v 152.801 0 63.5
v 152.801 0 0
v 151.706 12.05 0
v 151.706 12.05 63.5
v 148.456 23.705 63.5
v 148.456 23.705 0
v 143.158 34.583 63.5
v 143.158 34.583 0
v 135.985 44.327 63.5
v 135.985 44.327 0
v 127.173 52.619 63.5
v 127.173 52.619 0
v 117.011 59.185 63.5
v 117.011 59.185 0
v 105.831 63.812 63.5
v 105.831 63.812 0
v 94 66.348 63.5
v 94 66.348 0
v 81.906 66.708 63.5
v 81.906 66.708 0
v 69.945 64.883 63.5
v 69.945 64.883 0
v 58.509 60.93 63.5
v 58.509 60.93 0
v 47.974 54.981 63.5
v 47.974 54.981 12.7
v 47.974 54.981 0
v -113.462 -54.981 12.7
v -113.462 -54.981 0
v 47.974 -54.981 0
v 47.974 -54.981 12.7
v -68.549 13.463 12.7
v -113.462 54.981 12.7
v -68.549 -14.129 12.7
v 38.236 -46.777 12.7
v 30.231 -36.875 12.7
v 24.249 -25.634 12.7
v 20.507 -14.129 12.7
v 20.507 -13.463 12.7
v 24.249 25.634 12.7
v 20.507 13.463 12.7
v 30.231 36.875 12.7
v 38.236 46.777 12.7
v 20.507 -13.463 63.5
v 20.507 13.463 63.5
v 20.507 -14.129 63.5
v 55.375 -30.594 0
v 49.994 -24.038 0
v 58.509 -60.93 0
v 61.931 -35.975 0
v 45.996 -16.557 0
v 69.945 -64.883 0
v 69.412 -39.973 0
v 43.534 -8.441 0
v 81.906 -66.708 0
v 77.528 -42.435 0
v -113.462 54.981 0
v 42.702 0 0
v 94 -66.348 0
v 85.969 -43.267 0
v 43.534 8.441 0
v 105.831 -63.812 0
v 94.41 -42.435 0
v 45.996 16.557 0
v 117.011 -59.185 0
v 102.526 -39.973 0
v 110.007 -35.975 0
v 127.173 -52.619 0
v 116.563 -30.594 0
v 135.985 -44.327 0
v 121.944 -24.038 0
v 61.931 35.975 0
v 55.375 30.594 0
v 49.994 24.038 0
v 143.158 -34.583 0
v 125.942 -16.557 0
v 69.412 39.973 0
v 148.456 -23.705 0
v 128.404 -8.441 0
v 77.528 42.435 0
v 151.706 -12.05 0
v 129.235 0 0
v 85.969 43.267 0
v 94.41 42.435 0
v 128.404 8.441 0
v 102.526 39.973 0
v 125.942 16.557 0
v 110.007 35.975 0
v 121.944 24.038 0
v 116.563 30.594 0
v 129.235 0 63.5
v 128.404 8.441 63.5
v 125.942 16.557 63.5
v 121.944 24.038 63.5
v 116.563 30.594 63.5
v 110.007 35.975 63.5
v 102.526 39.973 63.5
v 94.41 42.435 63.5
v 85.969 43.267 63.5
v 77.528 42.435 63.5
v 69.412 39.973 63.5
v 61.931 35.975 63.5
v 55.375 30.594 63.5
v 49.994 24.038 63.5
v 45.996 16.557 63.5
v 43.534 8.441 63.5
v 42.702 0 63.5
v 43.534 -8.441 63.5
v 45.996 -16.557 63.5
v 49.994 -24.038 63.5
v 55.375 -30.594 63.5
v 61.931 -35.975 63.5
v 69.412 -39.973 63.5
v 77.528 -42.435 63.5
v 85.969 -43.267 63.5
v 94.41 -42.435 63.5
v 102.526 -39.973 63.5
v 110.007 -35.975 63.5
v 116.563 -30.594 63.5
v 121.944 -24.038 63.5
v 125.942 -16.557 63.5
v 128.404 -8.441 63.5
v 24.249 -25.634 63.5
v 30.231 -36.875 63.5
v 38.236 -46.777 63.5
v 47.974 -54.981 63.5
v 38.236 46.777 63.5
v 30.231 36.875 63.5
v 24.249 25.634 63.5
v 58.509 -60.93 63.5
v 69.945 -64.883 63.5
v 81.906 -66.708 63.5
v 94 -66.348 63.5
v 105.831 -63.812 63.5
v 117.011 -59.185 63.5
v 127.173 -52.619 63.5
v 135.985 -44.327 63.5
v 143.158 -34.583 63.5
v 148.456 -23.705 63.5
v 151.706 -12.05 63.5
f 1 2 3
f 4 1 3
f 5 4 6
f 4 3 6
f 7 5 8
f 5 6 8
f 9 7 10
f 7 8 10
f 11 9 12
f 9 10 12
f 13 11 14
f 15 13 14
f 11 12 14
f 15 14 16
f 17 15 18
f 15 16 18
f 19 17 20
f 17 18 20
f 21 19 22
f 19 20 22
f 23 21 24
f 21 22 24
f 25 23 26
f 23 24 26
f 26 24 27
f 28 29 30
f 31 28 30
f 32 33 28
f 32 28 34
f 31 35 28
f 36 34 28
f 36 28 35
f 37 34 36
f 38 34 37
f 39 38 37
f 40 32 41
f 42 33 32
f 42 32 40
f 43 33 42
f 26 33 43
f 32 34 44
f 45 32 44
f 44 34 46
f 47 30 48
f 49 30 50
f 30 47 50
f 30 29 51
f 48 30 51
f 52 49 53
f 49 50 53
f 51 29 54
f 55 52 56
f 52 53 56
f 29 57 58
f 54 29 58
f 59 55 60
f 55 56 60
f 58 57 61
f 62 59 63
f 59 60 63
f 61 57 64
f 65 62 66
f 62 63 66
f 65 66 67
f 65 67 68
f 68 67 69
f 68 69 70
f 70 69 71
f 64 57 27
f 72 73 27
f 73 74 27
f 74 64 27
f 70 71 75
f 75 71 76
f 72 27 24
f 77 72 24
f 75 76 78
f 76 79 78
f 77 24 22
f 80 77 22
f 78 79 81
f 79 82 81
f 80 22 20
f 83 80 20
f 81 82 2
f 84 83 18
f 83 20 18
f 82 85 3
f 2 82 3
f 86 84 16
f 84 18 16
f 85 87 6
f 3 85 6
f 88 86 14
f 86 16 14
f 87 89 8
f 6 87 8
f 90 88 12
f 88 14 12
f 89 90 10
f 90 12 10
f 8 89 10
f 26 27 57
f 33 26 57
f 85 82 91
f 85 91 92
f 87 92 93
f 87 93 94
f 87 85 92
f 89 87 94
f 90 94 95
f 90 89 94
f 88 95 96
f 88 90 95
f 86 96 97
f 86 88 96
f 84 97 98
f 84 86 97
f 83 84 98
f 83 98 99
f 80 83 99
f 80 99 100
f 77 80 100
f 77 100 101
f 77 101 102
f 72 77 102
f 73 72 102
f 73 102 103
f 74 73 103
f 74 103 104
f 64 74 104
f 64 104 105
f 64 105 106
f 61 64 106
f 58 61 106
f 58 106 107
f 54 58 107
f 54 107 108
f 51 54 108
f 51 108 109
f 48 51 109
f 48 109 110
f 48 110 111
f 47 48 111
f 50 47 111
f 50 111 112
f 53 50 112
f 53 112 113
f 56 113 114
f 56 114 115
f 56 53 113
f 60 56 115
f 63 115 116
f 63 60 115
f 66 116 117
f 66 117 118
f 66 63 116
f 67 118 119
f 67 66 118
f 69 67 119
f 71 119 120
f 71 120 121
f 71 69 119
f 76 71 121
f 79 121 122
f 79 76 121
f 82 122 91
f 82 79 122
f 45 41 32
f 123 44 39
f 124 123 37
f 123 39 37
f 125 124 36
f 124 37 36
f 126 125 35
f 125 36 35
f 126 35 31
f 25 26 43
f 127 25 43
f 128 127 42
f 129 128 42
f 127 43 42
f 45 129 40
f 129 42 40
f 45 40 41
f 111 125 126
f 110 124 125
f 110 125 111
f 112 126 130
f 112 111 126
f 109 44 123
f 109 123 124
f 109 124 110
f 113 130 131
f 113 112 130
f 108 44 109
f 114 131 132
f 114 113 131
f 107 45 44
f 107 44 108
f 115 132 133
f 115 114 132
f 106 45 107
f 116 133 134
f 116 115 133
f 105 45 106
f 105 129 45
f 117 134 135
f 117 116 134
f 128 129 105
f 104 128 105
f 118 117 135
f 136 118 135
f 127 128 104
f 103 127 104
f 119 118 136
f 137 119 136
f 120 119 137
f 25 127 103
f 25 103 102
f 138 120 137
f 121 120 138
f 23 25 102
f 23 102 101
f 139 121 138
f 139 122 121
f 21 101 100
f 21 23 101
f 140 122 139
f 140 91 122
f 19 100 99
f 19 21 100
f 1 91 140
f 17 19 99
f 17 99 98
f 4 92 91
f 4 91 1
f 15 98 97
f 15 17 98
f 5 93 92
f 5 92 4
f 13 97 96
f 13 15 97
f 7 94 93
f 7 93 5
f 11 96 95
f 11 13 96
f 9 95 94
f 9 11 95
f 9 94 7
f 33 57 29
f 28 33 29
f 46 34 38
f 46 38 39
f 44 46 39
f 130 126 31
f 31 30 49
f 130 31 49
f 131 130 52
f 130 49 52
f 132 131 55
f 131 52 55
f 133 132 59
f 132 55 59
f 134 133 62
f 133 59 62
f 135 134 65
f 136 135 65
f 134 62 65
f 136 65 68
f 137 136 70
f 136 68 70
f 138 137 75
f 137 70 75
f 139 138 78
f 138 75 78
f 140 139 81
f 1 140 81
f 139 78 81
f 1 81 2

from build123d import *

# Parameters (mm, degrees)
F0_R     = 43.266566
F1_DEPTH = 12.7
F2_DEPTH = 63.5
F4_DEPTH = 50.8
F6_DEPTH = 80.962192


with BuildPart() as f1:
    # F0 (on Top) → F1 (new body)
    with BuildSketch(Plane.XY):
        with BuildLine():
            ThreePointArc((47.97375, -54.980806), (117.011051, -59.185378), (152.800973, 0))
            ThreePointArc((152.800973, 0), (117.011051, 59.185378), (47.97375, 54.980806))
            ThreePointArc((47.97375, 54.980806), (19.13688, 0), (47.97375, -54.980806))
        make_face()
        with Locations((85.968927, 0)):
            Circle(F0_R, mode=Mode.SUBTRACT)
        with BuildLine():
            ThreePointArc((47.97375, -54.980806), (19.13688, 0), (47.97375, 54.980806))
            Line((47.97375, 54.980806), (-113.462299, 54.980806))
            Line((-113.462299, 54.980806), (-113.462299, -54.980806))
            Line((-113.462299, -54.980806), (47.97375, -54.980806))
        make_face()
    extrude(amount=F1_DEPTH)

    # F0 (on Top) → F2 (join)
    with BuildSketch(Plane.XY):
        with BuildLine():
            ThreePointArc((47.97375, -54.980806), (117.011051, -59.185378), (152.800973, 0))
            ThreePointArc((152.800973, 0), (117.011051, 59.185378), (47.97375, 54.980806))
            ThreePointArc((47.97375, 54.980806), (19.13688, 0), (47.97375, -54.980806))
        make_face()
        with Locations((85.968927, 0)):
            Circle(F0_R, mode=Mode.SUBTRACT)
    extrude(amount=F2_DEPTH)

    # F3 (on face) → F4 (join)
    with BuildSketch(Plane.XY.offset(12.7)):
        with BuildLine():
            ThreePointArc((20.507041, -13.463432), (19.13688, 0), (20.507041, 13.463432))
            Line((20.507041, 13.463432), (-68.548821, 13.463432))
            Line((-68.548821, 13.463432), (-68.548821, -14.129145))
            Line((-68.548821, -14.129145), (20.507041, -14.129145))
            Line((20.507041, -14.129145), (20.507041, -13.463432))
        make_face()
    extrude(amount=F4_DEPTH)

    # F5 (on face) → F6 (cut, through all)
    with BuildSketch(Plane.XZ.offset(14.129145)):
        Polygon((-68.548821, 12.7), (20.507041, 63.5), (-68.548821, 63.5), align=None)
    extrude(amount=-F6_DEPTH, mode=Mode.SUBTRACT)


solid = f1.part
